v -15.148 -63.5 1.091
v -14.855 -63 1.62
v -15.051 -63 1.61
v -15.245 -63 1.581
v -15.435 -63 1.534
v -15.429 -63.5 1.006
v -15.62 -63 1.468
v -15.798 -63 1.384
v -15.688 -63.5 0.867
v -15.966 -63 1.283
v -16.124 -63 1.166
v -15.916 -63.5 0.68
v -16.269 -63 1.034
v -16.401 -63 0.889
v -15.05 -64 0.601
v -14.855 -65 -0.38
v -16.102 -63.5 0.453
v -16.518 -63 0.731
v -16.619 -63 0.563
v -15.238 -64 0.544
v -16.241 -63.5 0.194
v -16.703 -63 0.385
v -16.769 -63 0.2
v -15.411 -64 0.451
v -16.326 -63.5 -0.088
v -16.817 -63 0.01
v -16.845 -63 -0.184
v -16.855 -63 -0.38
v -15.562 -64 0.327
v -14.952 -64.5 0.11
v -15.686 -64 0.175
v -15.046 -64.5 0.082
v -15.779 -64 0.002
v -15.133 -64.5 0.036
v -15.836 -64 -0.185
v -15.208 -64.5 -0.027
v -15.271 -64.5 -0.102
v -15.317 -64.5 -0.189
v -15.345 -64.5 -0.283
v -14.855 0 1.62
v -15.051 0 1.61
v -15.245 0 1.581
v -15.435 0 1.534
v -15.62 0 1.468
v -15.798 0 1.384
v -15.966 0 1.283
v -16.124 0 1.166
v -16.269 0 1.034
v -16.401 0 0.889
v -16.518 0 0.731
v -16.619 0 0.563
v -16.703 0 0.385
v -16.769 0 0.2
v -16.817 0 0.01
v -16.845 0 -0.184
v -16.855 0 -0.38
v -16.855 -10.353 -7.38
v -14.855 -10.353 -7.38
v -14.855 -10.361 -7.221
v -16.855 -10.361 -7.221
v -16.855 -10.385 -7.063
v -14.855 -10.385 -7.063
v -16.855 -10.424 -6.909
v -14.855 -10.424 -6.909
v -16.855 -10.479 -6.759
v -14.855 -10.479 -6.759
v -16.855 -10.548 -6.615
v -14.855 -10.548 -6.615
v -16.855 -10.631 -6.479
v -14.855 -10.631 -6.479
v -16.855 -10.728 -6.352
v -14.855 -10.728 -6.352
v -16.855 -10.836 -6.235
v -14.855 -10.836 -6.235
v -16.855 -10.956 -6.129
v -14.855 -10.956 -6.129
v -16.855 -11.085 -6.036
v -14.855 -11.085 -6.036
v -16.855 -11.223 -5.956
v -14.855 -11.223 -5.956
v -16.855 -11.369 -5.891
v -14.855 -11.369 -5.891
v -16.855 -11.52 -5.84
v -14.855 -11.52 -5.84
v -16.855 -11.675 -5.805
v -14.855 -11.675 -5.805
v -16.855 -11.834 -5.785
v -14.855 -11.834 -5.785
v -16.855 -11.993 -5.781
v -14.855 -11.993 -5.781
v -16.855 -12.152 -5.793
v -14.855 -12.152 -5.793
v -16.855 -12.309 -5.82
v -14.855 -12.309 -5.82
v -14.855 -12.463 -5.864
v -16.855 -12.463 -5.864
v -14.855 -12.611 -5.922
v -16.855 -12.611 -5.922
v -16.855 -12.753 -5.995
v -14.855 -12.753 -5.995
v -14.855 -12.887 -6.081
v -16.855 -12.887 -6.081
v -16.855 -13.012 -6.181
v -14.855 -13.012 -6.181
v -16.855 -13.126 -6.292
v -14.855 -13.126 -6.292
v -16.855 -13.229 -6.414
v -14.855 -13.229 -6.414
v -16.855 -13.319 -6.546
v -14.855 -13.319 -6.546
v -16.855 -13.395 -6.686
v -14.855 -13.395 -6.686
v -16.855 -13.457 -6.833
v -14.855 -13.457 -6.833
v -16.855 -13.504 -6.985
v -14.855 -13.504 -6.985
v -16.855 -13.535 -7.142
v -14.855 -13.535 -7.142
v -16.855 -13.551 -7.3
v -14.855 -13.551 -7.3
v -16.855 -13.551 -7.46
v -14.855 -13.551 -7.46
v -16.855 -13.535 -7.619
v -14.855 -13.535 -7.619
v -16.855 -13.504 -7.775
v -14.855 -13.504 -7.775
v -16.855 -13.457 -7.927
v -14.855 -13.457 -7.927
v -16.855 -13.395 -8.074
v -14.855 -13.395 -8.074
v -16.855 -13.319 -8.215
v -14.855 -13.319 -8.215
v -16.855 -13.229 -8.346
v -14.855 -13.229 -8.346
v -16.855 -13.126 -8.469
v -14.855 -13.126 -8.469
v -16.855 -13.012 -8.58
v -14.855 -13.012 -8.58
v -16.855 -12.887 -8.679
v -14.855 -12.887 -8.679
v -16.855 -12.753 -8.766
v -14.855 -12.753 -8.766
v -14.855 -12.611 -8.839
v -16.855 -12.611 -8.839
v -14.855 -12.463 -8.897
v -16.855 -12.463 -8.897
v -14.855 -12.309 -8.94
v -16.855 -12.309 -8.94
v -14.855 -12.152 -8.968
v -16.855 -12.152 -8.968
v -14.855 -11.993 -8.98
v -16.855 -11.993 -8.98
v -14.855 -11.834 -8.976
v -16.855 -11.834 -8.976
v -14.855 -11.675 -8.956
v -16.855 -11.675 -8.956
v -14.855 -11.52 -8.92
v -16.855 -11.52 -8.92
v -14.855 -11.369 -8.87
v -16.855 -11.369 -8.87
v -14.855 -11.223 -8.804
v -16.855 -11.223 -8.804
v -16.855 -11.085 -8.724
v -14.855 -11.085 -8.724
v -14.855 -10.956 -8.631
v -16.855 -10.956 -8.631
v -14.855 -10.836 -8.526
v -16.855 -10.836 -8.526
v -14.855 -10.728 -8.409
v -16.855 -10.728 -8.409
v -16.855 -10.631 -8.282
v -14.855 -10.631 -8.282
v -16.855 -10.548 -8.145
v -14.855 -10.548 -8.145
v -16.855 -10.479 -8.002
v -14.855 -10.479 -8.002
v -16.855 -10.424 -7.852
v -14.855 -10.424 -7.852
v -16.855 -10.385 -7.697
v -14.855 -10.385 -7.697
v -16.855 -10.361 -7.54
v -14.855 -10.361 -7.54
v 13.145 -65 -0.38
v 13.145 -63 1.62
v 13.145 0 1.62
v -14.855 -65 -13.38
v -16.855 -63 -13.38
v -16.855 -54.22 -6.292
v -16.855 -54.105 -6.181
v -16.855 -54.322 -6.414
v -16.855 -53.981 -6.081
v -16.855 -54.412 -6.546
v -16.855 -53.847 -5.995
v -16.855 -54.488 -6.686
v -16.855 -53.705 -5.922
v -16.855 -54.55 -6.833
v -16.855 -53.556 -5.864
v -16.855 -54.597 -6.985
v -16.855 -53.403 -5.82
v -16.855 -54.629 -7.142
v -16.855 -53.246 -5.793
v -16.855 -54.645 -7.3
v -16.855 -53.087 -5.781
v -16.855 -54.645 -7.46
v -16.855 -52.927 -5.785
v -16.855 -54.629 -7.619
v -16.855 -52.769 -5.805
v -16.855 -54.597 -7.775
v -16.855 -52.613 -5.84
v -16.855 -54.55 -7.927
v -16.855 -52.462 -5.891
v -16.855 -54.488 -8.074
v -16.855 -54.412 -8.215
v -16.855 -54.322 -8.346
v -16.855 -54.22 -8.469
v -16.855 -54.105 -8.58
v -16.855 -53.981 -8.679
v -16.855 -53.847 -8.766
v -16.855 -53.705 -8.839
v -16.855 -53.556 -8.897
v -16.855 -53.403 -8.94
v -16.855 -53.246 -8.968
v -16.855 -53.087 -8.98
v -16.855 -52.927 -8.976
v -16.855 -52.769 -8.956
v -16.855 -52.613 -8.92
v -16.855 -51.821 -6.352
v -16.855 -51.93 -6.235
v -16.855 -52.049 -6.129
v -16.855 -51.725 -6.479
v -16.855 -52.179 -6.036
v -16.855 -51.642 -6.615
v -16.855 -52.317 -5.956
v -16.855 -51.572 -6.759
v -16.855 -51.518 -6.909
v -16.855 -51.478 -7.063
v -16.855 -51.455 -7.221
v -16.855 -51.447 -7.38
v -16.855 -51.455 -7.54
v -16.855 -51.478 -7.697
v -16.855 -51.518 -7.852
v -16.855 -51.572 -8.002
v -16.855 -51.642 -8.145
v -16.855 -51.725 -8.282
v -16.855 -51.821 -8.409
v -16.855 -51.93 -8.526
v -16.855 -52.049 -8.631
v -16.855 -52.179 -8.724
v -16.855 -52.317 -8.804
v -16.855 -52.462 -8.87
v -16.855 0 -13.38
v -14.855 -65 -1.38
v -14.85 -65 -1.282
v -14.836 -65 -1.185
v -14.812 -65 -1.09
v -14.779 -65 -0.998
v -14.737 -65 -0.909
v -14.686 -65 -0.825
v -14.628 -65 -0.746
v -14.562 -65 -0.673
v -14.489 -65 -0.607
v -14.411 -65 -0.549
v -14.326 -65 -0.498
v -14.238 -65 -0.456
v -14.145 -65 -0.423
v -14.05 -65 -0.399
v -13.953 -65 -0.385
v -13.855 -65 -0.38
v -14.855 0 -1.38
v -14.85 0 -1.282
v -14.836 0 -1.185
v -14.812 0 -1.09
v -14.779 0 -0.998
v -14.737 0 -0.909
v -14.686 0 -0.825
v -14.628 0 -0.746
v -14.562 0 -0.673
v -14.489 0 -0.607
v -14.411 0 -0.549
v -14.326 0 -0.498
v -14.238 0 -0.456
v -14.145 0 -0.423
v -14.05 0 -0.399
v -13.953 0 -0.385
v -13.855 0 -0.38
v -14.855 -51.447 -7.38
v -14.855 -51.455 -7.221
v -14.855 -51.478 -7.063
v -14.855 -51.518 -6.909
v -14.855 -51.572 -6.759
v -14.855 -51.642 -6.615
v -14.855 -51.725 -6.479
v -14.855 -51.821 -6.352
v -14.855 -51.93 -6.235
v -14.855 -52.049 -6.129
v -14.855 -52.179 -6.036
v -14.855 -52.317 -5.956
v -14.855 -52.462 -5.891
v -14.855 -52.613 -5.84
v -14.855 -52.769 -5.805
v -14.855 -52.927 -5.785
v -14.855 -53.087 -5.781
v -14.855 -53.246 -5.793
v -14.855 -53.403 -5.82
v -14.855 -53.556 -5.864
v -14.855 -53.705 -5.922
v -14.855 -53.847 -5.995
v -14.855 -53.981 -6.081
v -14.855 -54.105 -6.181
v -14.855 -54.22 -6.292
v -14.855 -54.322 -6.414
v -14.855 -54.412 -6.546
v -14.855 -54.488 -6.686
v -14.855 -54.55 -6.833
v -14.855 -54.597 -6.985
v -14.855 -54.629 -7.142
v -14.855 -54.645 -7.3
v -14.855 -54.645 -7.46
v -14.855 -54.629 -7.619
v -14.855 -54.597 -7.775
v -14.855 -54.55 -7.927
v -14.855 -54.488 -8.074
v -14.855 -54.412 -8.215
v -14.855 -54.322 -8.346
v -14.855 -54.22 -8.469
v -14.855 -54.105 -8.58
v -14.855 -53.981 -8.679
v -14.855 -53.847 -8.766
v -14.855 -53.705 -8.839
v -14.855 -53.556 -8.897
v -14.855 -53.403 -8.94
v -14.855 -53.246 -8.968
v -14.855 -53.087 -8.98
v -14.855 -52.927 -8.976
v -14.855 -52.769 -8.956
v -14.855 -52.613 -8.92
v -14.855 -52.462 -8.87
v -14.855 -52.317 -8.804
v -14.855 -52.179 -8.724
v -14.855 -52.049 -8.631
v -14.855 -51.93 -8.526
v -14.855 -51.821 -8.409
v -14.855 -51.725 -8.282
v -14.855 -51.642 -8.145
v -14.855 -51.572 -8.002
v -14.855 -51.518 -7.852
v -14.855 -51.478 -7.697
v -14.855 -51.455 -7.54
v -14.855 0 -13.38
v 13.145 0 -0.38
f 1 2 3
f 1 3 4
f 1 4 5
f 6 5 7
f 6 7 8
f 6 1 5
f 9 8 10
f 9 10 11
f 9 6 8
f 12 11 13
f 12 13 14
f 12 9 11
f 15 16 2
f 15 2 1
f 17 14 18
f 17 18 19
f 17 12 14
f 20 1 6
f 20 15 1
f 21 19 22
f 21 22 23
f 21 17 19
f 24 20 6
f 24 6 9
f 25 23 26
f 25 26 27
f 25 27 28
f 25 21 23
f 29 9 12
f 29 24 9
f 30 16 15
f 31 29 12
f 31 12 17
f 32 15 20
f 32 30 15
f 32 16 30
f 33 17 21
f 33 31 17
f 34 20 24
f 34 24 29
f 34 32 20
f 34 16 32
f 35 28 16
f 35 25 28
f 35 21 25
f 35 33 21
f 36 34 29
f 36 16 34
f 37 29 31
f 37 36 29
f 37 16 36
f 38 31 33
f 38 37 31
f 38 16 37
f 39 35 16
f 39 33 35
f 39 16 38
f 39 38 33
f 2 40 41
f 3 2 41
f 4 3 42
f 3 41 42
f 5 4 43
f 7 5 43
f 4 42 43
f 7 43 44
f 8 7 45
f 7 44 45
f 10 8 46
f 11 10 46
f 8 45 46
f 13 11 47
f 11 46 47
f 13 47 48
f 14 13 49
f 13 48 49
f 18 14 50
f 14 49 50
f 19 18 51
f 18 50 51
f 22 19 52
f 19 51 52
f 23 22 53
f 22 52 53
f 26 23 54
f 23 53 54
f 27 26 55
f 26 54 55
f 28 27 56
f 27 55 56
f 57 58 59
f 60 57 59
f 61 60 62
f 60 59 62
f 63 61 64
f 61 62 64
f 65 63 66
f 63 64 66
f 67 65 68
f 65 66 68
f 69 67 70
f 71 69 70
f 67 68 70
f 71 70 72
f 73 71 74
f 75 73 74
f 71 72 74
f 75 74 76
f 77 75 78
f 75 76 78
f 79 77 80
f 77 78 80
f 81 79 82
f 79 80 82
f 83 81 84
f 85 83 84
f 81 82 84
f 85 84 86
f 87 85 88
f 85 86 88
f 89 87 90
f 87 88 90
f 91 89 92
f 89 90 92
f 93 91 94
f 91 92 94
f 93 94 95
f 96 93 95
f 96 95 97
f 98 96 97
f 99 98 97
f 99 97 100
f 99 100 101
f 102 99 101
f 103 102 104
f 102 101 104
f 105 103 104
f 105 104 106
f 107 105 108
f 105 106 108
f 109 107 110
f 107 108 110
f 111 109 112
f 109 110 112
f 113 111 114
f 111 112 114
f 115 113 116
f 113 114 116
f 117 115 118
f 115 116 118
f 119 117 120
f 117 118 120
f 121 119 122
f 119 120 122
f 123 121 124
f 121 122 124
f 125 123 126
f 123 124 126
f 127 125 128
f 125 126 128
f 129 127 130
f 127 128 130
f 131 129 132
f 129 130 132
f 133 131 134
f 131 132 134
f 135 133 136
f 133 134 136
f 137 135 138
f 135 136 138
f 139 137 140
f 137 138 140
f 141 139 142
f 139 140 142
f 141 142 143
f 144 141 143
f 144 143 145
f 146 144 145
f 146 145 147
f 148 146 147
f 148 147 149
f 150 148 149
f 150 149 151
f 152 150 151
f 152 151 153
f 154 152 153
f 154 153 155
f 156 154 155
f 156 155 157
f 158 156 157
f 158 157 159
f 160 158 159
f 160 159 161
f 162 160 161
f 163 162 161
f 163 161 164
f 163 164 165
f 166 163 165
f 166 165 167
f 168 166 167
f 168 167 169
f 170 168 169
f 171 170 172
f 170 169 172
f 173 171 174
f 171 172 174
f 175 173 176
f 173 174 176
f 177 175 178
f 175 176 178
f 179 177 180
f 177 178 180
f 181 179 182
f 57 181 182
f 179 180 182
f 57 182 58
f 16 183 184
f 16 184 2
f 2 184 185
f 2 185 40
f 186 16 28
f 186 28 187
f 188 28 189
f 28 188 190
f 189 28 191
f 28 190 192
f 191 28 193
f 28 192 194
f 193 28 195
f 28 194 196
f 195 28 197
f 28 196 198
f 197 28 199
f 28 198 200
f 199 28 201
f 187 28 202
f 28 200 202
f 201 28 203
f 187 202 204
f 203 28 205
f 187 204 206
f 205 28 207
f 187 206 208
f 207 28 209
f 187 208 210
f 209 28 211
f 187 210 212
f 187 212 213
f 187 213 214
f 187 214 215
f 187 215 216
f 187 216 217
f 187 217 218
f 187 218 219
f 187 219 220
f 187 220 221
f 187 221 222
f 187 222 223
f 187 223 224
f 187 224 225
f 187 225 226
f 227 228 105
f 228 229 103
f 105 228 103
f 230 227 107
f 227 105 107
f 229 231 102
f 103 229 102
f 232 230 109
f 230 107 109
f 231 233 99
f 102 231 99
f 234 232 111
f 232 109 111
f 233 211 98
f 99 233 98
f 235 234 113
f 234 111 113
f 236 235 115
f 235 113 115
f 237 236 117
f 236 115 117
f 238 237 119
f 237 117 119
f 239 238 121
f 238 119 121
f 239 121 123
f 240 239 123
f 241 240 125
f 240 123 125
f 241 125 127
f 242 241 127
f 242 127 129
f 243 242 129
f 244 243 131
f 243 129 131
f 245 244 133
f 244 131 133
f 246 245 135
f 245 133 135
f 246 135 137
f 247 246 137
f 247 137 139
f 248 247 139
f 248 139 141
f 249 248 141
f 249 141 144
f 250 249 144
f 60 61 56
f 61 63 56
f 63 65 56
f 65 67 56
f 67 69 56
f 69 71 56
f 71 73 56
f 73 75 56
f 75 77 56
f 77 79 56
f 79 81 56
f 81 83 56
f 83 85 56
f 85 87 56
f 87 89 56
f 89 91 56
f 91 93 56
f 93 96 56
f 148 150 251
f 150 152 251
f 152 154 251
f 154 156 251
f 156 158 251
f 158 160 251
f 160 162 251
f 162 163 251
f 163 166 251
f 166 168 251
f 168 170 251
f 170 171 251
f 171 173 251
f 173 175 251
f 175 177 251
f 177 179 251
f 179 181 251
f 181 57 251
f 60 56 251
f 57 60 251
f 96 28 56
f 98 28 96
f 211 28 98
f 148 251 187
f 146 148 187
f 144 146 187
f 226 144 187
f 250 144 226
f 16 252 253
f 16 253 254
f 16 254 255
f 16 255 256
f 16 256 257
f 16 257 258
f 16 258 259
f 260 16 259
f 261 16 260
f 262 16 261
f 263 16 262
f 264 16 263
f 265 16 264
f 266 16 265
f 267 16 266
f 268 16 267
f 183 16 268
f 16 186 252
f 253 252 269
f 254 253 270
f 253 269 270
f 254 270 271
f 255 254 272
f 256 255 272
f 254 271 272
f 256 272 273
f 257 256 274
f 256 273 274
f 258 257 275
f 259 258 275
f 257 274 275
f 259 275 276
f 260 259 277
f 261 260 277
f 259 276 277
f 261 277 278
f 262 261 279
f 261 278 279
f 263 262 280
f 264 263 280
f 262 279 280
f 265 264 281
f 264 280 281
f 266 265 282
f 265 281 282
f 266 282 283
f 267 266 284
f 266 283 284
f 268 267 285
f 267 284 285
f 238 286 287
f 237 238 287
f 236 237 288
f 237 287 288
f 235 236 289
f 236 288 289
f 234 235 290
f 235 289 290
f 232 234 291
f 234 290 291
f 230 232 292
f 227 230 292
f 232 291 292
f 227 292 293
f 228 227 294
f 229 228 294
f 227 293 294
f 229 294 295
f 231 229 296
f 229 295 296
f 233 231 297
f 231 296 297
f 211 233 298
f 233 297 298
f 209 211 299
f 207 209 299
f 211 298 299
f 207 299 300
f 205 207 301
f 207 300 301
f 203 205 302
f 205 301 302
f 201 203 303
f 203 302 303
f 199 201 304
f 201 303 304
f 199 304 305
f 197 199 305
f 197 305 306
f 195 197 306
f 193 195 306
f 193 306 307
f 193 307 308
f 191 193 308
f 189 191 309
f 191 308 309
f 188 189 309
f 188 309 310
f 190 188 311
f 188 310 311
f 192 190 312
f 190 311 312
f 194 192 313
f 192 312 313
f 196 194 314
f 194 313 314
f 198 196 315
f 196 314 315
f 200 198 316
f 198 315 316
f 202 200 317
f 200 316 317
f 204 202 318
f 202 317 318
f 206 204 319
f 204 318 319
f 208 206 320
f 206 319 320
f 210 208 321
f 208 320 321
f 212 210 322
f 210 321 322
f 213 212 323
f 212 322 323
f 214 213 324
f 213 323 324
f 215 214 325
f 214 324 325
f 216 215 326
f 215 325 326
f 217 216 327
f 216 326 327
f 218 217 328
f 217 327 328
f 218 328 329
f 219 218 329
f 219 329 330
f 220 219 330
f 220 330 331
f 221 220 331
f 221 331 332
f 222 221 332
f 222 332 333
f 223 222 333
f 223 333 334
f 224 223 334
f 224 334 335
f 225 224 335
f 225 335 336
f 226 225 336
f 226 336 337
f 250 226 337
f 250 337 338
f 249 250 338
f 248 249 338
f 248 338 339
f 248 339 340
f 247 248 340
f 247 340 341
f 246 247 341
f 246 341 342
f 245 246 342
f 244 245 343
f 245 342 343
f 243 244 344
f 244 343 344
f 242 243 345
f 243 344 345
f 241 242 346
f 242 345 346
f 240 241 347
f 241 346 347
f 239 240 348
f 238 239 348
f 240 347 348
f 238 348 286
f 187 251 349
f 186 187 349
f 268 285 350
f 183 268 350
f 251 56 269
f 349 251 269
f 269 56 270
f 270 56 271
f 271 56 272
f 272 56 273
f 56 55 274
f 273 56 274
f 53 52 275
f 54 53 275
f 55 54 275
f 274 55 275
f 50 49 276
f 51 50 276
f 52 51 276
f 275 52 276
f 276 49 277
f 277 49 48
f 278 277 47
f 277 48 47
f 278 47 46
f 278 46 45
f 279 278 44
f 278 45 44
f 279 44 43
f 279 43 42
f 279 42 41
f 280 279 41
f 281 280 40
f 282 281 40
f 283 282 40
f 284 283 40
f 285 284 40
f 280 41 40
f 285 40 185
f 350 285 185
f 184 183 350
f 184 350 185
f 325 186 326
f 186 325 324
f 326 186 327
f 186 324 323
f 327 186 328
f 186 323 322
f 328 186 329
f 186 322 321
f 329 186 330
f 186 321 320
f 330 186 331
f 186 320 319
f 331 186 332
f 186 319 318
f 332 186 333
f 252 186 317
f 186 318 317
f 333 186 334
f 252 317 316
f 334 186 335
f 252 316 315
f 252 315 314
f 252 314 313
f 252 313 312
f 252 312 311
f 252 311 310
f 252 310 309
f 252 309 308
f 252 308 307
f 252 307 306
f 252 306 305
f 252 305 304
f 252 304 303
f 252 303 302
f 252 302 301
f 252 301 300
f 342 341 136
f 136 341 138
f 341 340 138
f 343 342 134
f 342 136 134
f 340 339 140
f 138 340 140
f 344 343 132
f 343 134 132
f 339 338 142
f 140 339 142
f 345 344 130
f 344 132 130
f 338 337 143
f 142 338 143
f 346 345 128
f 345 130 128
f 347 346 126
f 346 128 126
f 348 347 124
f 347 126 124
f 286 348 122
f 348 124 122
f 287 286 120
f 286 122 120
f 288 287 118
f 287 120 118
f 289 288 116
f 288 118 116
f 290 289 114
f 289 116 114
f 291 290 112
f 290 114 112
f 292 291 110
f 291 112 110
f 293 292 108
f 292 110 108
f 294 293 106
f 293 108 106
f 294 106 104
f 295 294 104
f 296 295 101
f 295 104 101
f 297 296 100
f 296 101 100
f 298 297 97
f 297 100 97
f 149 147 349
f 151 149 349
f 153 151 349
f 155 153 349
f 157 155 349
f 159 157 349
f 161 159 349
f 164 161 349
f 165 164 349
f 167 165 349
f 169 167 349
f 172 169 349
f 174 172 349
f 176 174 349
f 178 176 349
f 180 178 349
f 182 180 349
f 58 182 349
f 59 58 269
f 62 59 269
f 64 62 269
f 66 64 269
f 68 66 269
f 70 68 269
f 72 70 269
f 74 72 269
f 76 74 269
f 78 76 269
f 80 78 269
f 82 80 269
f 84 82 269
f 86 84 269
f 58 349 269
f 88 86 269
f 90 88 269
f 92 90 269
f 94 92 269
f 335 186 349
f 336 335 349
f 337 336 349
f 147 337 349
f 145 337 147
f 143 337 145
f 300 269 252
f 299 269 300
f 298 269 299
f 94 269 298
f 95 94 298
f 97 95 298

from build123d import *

# Parameters (mm, degrees)
F1_DEPTH = 65
F2_SIZE  = 1.99999
F3_R     = 1.6
F4_DEPTH = 2


# Not quite as in the source:
# - a fillet or chamfer is up to 0.001 mm smaller than in the source, because OpenCascade refuses the exact size


with BuildPart() as f1:
    # F0 (on Front) → F1 (new body)
    with BuildSketch(Plane.XZ):
        with BuildLine():
            Line((-16.8549300951, -0.3802398592), (-16.8549300951, -13.3802398592))
            Line((-16.8549300951, -13.3802398592), (-14.8549300951, -13.3802398592))
            Line((-14.8549300951, -13.3802398592), (-14.8549300951, -1.3802398592))
            ThreePointArc((-14.8549300951, -1.3802398592), (-14.5620368763, -0.673133078), (-13.8549300951, -0.3802398592))
            Line((-13.8549300951, -0.3802398592), (13.1450699049, -0.3802398592))
            Line((13.1450699049, -0.3802398592), (13.1450699049, 1.6197601408))
            Line((13.1450699049, 1.6197601408), (-14.8549300951, 1.6197601408))
            ThreePointArc((-14.8549300951, 1.6197601408), (-16.2691436574, 1.0339737031), (-16.8549300951, -0.3802398592))
        make_face()
    extrude(amount=F1_DEPTH)

    # F2 (size 2 in the source; OpenCascade refuses exactly that, so slightly less here)
    f2_edges = [f1.edges().sort_by_distance(p)[0] for p in [
        (-16.85493, -65, -6.88024),
    ]]
    chamfer(f2_edges, length=F2_SIZE)

    # F3 (on face) → F4 (cut, through all)
    with BuildSketch(Plane.YZ.offset(-14.8549300951)):
        with Locations((-53.0466809869, -7.3802398592)):
            Circle(F3_R)
        with Locations((-11.9533190131, -7.3802398592)):
            Circle(F3_R)
    extrude(amount=-F4_DEPTH, mode=Mode.SUBTRACT)


solid = f1.part
